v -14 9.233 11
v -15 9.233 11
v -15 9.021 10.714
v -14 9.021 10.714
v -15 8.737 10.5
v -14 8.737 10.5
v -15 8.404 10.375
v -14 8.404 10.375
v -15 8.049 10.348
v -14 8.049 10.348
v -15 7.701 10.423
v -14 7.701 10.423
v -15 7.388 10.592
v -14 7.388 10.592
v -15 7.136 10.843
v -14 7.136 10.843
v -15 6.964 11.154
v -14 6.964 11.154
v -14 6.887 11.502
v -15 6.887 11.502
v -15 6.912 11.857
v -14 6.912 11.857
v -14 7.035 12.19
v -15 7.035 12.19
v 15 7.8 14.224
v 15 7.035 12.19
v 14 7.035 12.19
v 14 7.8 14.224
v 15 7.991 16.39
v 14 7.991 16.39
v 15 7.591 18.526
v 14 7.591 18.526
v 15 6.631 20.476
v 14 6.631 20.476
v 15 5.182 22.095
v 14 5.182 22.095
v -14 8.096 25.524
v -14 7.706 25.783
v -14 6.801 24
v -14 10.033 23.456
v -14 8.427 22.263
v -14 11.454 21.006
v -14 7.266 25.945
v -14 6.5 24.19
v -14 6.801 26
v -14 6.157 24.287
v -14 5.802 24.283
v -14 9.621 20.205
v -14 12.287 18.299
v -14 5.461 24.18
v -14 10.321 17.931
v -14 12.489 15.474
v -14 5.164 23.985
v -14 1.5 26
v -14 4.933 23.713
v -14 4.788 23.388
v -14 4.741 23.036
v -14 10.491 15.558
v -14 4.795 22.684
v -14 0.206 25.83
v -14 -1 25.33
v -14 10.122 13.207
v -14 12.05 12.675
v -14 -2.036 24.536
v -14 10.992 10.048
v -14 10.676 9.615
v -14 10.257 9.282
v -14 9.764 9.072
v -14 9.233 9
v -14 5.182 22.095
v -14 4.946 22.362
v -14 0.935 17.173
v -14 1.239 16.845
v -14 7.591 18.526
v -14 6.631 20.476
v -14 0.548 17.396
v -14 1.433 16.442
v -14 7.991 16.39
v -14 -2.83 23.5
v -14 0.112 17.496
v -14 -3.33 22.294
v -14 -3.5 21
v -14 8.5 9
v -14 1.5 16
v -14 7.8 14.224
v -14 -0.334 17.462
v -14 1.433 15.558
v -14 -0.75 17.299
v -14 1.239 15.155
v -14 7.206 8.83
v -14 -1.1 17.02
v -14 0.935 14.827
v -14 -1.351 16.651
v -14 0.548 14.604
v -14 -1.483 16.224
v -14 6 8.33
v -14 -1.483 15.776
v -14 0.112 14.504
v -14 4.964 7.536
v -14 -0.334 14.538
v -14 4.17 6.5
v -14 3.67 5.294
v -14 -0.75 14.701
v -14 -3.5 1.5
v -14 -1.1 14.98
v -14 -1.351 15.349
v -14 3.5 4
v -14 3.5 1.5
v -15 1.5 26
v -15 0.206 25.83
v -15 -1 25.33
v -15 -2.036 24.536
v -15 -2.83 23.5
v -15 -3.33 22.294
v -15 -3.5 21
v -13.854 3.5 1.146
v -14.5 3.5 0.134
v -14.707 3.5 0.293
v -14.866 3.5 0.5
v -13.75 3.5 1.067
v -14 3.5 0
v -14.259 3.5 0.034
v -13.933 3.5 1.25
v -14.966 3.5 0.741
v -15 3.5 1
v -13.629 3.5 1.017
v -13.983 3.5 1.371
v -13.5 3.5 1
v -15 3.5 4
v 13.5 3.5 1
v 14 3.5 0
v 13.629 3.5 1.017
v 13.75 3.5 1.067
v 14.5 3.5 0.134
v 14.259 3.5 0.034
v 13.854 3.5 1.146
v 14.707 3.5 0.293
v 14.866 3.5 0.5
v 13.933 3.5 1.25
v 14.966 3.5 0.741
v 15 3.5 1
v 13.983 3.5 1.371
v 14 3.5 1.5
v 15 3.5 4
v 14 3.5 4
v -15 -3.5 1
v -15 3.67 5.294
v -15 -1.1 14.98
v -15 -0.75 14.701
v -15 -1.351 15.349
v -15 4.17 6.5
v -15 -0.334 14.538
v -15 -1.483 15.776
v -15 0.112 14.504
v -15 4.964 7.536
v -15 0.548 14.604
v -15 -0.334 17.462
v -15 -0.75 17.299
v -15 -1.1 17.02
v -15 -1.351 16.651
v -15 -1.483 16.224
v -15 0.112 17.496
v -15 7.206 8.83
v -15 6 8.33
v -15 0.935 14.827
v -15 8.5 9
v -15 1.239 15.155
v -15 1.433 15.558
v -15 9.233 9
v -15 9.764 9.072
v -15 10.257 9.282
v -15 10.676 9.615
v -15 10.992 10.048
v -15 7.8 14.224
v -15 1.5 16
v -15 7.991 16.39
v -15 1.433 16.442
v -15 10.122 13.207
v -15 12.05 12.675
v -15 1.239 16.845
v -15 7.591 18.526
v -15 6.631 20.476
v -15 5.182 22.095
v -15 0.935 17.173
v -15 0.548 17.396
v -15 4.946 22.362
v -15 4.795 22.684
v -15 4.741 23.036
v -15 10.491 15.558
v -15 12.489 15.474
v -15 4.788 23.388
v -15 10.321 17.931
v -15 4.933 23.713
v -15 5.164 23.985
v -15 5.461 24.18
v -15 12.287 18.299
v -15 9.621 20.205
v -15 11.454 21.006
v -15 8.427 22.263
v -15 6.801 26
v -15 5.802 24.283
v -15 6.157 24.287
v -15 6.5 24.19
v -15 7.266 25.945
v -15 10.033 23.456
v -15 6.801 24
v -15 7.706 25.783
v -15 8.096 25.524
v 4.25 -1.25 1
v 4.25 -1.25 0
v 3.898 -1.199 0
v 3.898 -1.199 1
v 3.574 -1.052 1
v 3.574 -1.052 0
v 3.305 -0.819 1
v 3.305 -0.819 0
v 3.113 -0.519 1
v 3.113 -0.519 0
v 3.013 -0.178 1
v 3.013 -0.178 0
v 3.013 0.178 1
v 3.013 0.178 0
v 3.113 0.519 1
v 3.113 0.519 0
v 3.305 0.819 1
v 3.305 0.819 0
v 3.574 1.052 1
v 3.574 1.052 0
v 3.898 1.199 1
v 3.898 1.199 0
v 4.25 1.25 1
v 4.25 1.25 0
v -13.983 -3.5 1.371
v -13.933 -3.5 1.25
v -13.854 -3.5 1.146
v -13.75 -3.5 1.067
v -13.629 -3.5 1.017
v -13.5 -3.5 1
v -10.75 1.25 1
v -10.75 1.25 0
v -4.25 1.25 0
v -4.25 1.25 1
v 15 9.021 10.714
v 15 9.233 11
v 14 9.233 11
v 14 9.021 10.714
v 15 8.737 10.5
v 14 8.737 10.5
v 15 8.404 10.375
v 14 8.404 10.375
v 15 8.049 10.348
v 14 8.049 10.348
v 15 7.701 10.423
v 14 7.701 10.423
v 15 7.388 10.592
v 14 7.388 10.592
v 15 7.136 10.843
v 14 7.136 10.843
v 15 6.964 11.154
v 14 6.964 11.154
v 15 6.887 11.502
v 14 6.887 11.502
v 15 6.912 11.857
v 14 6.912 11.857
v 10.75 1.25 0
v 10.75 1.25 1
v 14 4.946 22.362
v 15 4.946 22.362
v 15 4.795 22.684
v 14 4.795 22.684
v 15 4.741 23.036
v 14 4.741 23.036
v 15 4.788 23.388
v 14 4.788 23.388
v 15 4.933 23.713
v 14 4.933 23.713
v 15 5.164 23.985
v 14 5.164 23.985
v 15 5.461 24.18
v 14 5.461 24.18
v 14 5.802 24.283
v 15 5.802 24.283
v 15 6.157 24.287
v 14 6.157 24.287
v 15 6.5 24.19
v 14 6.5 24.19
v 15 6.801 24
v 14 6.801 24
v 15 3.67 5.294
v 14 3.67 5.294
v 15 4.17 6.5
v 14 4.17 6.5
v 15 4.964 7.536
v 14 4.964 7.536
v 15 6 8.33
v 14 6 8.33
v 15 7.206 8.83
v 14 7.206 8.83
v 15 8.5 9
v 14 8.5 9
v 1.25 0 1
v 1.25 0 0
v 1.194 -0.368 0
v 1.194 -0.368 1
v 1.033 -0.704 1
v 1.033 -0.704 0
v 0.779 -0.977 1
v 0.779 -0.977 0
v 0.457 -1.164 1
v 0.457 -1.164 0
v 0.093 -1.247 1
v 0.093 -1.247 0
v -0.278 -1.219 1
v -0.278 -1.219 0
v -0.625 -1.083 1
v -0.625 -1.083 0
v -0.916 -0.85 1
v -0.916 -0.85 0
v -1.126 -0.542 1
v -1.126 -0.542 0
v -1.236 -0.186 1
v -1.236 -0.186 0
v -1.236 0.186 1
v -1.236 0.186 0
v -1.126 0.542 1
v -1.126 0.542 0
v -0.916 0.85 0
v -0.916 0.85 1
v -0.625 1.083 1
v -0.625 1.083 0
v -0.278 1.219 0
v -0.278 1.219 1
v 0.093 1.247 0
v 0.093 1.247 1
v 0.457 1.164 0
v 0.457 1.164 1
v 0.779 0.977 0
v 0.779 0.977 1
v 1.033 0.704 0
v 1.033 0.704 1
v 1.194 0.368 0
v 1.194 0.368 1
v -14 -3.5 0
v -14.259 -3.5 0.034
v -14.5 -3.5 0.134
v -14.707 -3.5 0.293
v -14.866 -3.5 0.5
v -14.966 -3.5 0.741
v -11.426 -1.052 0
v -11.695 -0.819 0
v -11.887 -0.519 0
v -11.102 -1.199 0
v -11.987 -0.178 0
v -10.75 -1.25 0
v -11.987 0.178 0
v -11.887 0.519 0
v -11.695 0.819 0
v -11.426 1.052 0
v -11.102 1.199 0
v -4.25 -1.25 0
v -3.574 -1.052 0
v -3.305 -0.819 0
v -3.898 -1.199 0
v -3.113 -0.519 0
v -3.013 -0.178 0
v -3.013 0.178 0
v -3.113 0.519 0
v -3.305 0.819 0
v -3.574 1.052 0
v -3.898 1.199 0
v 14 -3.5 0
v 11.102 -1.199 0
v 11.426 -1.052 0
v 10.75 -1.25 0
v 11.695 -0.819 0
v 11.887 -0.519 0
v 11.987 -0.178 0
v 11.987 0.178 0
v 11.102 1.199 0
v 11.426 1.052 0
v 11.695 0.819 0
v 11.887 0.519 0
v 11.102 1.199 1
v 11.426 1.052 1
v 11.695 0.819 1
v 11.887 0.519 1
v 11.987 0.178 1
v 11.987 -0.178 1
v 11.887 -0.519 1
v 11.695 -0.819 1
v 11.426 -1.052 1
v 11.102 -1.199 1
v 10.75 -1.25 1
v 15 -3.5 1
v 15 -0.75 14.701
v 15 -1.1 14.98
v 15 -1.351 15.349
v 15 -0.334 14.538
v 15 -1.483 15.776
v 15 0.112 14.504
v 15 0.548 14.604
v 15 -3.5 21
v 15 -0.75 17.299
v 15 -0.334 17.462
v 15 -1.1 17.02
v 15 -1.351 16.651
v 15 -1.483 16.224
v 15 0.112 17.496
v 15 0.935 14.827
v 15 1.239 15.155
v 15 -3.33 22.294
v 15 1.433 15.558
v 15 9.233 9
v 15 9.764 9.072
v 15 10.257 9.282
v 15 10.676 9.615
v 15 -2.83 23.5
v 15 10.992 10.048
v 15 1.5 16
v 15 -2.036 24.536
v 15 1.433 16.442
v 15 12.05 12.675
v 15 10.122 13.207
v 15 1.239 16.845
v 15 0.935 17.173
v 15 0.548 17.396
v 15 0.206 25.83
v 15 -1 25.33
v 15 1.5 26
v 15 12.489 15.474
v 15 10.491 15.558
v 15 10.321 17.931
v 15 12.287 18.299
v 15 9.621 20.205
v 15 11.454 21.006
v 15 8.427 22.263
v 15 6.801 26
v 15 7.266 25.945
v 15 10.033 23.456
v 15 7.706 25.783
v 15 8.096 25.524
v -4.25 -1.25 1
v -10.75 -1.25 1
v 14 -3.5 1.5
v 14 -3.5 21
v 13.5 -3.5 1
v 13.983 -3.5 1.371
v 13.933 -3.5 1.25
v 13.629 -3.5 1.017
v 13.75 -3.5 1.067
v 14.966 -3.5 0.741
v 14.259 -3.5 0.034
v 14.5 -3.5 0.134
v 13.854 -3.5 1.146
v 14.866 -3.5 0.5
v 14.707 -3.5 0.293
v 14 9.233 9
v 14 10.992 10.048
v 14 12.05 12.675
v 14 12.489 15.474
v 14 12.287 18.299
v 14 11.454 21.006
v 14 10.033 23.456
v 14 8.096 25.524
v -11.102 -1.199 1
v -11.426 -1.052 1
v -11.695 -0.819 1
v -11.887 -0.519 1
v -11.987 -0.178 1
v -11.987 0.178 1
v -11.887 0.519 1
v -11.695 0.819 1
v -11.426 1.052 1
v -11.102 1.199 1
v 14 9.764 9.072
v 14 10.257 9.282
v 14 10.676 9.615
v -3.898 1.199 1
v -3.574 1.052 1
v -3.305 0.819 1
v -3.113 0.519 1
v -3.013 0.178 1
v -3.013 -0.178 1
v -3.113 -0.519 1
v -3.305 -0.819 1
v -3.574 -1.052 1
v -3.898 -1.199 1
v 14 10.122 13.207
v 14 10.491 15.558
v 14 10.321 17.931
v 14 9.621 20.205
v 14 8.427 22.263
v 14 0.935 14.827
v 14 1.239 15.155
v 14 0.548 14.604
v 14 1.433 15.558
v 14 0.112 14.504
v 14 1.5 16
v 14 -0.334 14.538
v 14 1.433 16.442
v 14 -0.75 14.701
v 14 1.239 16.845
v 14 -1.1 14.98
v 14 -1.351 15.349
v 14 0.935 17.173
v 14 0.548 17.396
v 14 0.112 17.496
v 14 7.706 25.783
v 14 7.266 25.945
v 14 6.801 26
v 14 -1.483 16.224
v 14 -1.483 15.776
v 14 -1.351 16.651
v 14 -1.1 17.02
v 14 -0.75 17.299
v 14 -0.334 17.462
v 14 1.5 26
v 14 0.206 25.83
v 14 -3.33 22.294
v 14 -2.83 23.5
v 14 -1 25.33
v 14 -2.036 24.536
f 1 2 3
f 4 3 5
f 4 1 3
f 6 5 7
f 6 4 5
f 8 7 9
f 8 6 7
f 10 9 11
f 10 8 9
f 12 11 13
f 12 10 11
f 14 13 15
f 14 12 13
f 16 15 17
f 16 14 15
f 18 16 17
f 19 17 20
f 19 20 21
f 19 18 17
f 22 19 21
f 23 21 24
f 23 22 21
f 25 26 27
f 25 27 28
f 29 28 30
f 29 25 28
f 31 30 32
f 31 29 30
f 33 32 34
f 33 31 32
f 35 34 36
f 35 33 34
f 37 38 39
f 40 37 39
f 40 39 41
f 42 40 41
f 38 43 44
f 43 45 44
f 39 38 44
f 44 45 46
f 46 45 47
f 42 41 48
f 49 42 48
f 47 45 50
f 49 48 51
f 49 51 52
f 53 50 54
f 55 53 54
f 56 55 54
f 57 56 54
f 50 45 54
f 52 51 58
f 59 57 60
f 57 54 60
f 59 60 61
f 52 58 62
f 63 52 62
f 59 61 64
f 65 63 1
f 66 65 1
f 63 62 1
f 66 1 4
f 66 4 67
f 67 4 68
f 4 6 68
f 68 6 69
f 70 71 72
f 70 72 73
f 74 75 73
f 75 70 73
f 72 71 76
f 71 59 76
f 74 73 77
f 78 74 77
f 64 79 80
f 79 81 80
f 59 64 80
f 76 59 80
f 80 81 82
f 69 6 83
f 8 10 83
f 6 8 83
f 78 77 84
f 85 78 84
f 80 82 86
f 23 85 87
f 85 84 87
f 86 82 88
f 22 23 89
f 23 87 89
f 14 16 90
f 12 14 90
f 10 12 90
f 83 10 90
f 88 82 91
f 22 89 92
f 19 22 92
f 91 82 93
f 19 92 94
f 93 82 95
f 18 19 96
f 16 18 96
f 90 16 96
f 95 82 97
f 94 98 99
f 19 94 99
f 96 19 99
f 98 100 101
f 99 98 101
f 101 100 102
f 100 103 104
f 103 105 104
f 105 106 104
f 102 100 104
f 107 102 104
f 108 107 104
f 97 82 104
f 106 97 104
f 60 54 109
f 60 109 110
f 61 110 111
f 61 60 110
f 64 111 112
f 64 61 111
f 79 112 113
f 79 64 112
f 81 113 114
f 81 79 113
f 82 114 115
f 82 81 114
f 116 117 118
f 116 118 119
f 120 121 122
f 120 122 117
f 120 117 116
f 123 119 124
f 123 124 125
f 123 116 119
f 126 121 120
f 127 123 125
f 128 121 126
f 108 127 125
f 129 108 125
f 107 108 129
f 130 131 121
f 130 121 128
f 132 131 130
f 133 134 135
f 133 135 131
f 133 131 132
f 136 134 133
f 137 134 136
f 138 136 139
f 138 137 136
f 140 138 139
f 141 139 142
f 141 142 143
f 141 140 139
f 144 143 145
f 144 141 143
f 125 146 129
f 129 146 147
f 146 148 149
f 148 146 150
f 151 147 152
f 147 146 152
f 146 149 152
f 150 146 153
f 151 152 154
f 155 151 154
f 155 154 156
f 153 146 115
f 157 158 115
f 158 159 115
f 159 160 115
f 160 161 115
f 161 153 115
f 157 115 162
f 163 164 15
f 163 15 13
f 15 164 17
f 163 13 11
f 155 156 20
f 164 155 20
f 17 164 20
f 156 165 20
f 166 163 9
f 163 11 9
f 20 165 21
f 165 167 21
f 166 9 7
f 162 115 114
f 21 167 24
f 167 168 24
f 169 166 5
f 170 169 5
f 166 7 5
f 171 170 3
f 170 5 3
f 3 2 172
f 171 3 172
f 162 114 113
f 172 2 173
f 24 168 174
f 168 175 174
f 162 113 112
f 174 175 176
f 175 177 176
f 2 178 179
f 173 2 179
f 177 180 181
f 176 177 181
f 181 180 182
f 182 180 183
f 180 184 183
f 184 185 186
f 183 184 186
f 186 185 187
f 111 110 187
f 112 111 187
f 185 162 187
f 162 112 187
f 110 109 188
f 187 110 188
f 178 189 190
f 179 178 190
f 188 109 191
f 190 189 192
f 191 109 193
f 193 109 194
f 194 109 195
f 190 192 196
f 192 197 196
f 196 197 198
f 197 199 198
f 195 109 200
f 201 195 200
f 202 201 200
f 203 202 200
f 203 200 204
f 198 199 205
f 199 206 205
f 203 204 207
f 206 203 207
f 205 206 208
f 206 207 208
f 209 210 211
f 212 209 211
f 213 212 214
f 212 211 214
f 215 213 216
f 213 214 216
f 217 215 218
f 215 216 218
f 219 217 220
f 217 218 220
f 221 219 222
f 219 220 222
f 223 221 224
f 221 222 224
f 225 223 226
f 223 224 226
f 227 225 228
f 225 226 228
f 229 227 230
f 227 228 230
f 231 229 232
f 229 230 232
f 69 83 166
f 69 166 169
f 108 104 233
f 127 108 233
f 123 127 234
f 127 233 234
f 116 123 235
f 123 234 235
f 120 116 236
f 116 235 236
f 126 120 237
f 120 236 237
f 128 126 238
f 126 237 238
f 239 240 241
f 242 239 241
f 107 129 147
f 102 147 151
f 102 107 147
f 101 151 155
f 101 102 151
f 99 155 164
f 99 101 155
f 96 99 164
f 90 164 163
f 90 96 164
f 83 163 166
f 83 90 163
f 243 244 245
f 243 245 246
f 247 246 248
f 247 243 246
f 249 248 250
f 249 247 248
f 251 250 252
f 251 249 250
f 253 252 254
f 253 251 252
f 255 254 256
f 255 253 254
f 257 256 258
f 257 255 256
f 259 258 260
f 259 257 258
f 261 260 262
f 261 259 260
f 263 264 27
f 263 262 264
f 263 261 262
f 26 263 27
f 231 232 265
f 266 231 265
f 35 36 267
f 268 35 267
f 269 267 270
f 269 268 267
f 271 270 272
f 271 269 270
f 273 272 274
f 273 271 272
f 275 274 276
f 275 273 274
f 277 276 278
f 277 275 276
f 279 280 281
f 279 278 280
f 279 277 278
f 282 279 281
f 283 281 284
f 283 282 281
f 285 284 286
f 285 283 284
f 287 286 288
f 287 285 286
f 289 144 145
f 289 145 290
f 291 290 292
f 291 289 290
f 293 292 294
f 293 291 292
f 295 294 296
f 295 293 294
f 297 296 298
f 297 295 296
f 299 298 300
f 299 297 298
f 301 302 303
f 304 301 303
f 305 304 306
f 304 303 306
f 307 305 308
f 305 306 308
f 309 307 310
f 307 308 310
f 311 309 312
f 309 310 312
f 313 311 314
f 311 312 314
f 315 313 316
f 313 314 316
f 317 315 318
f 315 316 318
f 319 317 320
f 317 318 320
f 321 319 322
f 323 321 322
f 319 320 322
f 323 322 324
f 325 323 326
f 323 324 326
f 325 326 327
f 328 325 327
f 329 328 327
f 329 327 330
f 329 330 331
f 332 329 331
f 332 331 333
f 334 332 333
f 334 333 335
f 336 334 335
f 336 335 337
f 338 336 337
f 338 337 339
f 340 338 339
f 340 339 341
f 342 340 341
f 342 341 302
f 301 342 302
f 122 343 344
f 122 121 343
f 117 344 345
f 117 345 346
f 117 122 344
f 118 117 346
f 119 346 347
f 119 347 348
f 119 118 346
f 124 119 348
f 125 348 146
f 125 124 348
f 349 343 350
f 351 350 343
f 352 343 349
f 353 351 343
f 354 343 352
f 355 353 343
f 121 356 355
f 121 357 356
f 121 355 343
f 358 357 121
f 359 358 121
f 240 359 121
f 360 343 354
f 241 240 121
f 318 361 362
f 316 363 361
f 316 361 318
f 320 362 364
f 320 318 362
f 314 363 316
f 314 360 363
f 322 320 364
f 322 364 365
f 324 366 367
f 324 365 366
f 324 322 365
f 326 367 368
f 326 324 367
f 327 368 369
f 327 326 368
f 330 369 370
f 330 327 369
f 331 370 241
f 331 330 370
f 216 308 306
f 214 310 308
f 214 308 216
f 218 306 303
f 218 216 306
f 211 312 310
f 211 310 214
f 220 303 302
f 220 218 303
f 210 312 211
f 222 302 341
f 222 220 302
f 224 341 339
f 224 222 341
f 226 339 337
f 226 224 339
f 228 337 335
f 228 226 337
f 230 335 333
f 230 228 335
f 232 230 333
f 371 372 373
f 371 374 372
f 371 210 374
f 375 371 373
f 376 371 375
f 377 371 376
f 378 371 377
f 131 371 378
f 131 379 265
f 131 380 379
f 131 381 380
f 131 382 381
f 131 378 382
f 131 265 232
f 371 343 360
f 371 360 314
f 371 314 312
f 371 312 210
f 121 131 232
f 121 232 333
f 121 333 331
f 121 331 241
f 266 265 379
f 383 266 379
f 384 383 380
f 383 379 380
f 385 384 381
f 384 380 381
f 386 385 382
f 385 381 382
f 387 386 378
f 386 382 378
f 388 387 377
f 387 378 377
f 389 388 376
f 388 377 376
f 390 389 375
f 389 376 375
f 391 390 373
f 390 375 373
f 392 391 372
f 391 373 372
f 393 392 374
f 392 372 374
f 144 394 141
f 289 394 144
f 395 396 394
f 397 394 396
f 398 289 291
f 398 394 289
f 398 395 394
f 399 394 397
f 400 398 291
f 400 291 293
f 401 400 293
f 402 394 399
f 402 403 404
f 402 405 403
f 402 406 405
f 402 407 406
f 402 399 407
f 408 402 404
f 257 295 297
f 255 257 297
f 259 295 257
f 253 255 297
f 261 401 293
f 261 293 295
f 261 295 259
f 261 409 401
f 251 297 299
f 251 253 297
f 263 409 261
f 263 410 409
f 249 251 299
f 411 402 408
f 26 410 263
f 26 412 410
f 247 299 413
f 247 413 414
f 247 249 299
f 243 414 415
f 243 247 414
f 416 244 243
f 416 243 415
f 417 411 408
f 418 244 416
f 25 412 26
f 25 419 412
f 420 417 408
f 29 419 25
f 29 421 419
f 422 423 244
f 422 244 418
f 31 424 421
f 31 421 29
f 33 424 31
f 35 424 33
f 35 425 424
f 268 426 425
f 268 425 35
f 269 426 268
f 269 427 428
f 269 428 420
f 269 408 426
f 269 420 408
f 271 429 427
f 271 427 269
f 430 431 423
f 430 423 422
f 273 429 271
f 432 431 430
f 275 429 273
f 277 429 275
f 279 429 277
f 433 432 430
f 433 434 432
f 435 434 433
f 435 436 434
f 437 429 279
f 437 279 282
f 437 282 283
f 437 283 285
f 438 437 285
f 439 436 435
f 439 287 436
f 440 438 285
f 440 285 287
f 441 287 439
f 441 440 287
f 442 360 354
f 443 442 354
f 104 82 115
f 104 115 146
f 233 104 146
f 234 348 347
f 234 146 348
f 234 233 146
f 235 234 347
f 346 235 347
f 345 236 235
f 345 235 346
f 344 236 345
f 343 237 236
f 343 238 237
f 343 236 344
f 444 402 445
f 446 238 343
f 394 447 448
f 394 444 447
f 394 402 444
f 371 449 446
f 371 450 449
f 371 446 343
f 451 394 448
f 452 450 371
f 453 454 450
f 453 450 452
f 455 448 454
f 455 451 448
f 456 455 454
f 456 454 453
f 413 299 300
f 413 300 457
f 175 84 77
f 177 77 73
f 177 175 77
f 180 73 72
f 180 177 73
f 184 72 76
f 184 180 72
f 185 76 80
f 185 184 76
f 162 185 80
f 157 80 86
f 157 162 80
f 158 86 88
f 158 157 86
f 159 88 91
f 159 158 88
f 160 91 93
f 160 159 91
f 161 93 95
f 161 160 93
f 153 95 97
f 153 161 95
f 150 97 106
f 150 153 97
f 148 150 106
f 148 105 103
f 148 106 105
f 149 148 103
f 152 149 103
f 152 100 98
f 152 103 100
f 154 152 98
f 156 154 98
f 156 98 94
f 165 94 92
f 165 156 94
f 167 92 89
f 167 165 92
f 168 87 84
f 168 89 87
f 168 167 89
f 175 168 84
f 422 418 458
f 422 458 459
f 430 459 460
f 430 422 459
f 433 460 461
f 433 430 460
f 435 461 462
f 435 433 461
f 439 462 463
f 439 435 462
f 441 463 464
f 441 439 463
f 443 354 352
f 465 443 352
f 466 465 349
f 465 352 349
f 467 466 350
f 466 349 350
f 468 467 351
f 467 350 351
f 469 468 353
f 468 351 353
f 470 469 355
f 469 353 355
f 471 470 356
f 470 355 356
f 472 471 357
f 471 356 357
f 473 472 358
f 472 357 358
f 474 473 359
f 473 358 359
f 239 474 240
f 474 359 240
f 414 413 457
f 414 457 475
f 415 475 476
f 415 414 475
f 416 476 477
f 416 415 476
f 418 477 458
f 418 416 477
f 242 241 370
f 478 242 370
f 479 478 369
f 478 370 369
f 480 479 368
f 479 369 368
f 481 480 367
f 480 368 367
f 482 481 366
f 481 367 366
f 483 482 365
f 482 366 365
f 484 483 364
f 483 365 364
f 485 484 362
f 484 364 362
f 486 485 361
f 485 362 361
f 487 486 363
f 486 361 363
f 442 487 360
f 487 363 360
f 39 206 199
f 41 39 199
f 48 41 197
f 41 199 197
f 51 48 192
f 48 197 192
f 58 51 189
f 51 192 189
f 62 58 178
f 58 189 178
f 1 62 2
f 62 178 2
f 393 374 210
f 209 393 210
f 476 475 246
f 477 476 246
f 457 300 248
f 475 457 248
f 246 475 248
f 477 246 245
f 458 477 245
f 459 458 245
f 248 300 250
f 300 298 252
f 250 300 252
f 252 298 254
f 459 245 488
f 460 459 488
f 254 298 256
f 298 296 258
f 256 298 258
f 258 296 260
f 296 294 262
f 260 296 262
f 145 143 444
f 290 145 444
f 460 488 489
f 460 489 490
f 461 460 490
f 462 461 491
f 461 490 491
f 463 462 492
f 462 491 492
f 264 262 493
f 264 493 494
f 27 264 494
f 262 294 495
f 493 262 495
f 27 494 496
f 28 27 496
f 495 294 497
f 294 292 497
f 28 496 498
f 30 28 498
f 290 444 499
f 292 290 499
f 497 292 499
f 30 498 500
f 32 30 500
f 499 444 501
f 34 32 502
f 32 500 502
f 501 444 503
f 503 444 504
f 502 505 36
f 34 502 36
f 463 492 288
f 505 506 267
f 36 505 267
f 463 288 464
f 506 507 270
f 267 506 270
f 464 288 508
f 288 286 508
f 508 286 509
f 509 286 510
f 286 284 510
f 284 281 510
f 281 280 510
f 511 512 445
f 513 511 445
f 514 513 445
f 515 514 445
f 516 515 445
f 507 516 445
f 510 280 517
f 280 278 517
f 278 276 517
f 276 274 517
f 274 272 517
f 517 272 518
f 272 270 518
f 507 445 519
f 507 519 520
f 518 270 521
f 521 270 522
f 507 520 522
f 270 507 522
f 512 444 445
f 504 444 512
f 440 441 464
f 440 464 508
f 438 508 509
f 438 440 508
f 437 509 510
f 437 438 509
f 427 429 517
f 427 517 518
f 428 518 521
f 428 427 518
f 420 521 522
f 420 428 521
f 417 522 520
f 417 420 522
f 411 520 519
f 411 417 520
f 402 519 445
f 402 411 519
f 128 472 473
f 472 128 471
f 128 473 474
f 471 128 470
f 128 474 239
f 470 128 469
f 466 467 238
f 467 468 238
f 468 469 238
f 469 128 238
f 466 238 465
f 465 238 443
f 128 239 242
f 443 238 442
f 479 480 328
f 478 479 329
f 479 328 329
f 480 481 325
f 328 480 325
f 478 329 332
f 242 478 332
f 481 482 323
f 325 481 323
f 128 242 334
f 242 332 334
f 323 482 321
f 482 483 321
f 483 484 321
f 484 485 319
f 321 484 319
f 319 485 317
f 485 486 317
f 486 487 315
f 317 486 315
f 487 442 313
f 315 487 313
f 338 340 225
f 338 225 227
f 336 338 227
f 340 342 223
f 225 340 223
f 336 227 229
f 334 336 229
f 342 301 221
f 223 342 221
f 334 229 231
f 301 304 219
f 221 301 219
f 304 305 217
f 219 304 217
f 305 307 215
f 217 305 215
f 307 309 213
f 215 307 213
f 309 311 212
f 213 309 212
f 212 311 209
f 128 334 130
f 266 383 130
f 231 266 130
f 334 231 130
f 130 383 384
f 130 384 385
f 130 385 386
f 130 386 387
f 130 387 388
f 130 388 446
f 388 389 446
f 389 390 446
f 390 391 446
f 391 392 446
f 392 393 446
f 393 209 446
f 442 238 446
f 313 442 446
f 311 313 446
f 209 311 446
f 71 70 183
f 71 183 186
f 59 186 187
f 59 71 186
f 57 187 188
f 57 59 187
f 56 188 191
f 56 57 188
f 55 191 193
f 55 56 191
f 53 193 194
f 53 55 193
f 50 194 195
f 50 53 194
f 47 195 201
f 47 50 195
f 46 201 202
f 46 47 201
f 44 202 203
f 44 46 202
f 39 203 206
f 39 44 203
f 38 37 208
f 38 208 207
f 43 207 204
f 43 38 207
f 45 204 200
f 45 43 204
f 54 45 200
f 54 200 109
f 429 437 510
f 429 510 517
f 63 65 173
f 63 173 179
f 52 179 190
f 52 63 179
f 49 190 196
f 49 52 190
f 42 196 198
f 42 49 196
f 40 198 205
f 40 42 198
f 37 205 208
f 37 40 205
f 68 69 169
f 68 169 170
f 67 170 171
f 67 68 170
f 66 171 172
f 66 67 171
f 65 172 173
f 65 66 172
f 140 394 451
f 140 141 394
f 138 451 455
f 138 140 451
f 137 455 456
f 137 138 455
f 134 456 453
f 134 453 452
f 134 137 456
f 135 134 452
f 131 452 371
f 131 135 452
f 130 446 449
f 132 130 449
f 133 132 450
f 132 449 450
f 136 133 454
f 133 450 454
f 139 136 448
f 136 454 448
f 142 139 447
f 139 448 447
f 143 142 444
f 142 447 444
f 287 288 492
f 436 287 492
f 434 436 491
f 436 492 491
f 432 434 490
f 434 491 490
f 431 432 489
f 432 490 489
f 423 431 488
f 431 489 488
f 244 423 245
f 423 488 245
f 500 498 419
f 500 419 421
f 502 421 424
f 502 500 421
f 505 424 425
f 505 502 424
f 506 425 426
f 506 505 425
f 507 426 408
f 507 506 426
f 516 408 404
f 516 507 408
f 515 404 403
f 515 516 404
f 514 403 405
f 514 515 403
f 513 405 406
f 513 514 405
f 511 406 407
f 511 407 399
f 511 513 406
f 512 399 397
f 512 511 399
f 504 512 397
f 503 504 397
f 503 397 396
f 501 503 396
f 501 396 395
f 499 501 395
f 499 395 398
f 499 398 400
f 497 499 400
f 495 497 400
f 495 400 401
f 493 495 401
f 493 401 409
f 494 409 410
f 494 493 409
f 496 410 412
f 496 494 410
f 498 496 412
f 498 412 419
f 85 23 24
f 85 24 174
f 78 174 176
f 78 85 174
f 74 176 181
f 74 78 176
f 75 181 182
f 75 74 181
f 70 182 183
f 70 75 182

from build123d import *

# Parameters (mm, degrees)
F0_R     = 1.5
F1_DEPTH = 15
F3_DEPTH = 25
F4_R     = 1
F5_R     = 1.25
F6_DEPTH = 25


with BuildPart() as f1:
    # F0 (on Right) → F1 (new body, symmetric)
    with BuildSketch(Plane.YZ):
        with BuildLine():
            Line((-3.5, 21), (-3.5, 0))
            Line((-3.5, 0), (3.5, 0))
            Line((3.5, 0), (3.5, 4))
            ThreePointArc((3.5, 4), (4.964466, 7.535534), (8.5, 9))
            Line((8.5, 9), (9.233093, 9))
            ThreePointArc((9.233093, 9), (10.256625, 9.281751), (10.991777, 10.047619))
            ThreePointArc((10.991777, 10.047619), (12.286782, 18.298911), (8.096113, 25.52381))
            ThreePointArc((8.096113, 25.52381), (7.490801, 25.877181), (6.800735, 26))
            Line((6.800735, 26), (1.5, 26))
            ThreePointArc((1.5, 26), (-2.035534, 24.535534), (-3.5, 21))
        make_face()
        with Locations((0, 16)):
            Circle(F0_R, mode=Mode.SUBTRACT)
        with BuildLine():
            ThreePointArc((6.800735, 24), (10.320897, 17.931085), (9.233093, 11))
            ThreePointArc((9.233093, 11), (7.538677, 10.49606), (7.034737, 12.190476))
            ThreePointArc((7.034737, 12.190476), (7.86354, 17.471303), (5.181513, 22.095238))
            ThreePointArc((5.181513, 22.095238), (5.038743, 23.85723), (6.800735, 24))
        make_face(mode=Mode.SUBTRACT)
    extrude(amount=F1_DEPTH, both=True)

    # F2 (on face) → F3 (cut)
    with BuildSketch(Plane.XZ.offset(3.5)):
        with BuildLine():
            Line((14, 26), (-14, 26))
            Line((-14, 26), (-14, 1.5))
            ThreePointArc((-14, 1.5), (-13.853553, 1.146447), (-13.5, 1))
            Line((-13.5, 1), (13.5, 1))
            ThreePointArc((13.5, 1), (13.853553, 1.146447), (14, 1.5))
            Line((14, 1.5), (14, 26))
        make_face()
    extrude(amount=-F3_DEPTH, mode=Mode.SUBTRACT)

    # F4
    f4_edges = [f1.edges().sort_by_distance(p)[0] for p in [
        (-15, 0, 0),
        (15, 0, 0),
    ]]
    fillet(f4_edges, radius=F4_R)

    # F5 (on face) → F6 (cut)
    with BuildSketch(Plane(origin=(0, 0, 0), x_dir=(1, 0, 0), z_dir=(0, 0, -1))):
        Circle(F5_R)
        with BuildLine():
            ThreePointArc((-10.75, 1.25), (-12, 0), (-10.75, -1.25))
            Line((-10.75, -1.25), (-4.25, -1.25))
            ThreePointArc((-4.25, -1.25), (-3, 0), (-4.25, 1.25))
            Line((-4.25, 1.25), (-10.75, 1.25))
        make_face()
        with BuildLine():
            ThreePointArc((10.75, -1.25), (12, 0), (10.75, 1.25))
            Line((10.75, 1.25), (4.25, 1.25))
            ThreePointArc((4.25, 1.25), (3, 0), (4.25, -1.25))
            Line((4.25, -1.25), (10.75, -1.25))
        make_face()
    extrude(amount=-F6_DEPTH, mode=Mode.SUBTRACT)


solid = f1.part
